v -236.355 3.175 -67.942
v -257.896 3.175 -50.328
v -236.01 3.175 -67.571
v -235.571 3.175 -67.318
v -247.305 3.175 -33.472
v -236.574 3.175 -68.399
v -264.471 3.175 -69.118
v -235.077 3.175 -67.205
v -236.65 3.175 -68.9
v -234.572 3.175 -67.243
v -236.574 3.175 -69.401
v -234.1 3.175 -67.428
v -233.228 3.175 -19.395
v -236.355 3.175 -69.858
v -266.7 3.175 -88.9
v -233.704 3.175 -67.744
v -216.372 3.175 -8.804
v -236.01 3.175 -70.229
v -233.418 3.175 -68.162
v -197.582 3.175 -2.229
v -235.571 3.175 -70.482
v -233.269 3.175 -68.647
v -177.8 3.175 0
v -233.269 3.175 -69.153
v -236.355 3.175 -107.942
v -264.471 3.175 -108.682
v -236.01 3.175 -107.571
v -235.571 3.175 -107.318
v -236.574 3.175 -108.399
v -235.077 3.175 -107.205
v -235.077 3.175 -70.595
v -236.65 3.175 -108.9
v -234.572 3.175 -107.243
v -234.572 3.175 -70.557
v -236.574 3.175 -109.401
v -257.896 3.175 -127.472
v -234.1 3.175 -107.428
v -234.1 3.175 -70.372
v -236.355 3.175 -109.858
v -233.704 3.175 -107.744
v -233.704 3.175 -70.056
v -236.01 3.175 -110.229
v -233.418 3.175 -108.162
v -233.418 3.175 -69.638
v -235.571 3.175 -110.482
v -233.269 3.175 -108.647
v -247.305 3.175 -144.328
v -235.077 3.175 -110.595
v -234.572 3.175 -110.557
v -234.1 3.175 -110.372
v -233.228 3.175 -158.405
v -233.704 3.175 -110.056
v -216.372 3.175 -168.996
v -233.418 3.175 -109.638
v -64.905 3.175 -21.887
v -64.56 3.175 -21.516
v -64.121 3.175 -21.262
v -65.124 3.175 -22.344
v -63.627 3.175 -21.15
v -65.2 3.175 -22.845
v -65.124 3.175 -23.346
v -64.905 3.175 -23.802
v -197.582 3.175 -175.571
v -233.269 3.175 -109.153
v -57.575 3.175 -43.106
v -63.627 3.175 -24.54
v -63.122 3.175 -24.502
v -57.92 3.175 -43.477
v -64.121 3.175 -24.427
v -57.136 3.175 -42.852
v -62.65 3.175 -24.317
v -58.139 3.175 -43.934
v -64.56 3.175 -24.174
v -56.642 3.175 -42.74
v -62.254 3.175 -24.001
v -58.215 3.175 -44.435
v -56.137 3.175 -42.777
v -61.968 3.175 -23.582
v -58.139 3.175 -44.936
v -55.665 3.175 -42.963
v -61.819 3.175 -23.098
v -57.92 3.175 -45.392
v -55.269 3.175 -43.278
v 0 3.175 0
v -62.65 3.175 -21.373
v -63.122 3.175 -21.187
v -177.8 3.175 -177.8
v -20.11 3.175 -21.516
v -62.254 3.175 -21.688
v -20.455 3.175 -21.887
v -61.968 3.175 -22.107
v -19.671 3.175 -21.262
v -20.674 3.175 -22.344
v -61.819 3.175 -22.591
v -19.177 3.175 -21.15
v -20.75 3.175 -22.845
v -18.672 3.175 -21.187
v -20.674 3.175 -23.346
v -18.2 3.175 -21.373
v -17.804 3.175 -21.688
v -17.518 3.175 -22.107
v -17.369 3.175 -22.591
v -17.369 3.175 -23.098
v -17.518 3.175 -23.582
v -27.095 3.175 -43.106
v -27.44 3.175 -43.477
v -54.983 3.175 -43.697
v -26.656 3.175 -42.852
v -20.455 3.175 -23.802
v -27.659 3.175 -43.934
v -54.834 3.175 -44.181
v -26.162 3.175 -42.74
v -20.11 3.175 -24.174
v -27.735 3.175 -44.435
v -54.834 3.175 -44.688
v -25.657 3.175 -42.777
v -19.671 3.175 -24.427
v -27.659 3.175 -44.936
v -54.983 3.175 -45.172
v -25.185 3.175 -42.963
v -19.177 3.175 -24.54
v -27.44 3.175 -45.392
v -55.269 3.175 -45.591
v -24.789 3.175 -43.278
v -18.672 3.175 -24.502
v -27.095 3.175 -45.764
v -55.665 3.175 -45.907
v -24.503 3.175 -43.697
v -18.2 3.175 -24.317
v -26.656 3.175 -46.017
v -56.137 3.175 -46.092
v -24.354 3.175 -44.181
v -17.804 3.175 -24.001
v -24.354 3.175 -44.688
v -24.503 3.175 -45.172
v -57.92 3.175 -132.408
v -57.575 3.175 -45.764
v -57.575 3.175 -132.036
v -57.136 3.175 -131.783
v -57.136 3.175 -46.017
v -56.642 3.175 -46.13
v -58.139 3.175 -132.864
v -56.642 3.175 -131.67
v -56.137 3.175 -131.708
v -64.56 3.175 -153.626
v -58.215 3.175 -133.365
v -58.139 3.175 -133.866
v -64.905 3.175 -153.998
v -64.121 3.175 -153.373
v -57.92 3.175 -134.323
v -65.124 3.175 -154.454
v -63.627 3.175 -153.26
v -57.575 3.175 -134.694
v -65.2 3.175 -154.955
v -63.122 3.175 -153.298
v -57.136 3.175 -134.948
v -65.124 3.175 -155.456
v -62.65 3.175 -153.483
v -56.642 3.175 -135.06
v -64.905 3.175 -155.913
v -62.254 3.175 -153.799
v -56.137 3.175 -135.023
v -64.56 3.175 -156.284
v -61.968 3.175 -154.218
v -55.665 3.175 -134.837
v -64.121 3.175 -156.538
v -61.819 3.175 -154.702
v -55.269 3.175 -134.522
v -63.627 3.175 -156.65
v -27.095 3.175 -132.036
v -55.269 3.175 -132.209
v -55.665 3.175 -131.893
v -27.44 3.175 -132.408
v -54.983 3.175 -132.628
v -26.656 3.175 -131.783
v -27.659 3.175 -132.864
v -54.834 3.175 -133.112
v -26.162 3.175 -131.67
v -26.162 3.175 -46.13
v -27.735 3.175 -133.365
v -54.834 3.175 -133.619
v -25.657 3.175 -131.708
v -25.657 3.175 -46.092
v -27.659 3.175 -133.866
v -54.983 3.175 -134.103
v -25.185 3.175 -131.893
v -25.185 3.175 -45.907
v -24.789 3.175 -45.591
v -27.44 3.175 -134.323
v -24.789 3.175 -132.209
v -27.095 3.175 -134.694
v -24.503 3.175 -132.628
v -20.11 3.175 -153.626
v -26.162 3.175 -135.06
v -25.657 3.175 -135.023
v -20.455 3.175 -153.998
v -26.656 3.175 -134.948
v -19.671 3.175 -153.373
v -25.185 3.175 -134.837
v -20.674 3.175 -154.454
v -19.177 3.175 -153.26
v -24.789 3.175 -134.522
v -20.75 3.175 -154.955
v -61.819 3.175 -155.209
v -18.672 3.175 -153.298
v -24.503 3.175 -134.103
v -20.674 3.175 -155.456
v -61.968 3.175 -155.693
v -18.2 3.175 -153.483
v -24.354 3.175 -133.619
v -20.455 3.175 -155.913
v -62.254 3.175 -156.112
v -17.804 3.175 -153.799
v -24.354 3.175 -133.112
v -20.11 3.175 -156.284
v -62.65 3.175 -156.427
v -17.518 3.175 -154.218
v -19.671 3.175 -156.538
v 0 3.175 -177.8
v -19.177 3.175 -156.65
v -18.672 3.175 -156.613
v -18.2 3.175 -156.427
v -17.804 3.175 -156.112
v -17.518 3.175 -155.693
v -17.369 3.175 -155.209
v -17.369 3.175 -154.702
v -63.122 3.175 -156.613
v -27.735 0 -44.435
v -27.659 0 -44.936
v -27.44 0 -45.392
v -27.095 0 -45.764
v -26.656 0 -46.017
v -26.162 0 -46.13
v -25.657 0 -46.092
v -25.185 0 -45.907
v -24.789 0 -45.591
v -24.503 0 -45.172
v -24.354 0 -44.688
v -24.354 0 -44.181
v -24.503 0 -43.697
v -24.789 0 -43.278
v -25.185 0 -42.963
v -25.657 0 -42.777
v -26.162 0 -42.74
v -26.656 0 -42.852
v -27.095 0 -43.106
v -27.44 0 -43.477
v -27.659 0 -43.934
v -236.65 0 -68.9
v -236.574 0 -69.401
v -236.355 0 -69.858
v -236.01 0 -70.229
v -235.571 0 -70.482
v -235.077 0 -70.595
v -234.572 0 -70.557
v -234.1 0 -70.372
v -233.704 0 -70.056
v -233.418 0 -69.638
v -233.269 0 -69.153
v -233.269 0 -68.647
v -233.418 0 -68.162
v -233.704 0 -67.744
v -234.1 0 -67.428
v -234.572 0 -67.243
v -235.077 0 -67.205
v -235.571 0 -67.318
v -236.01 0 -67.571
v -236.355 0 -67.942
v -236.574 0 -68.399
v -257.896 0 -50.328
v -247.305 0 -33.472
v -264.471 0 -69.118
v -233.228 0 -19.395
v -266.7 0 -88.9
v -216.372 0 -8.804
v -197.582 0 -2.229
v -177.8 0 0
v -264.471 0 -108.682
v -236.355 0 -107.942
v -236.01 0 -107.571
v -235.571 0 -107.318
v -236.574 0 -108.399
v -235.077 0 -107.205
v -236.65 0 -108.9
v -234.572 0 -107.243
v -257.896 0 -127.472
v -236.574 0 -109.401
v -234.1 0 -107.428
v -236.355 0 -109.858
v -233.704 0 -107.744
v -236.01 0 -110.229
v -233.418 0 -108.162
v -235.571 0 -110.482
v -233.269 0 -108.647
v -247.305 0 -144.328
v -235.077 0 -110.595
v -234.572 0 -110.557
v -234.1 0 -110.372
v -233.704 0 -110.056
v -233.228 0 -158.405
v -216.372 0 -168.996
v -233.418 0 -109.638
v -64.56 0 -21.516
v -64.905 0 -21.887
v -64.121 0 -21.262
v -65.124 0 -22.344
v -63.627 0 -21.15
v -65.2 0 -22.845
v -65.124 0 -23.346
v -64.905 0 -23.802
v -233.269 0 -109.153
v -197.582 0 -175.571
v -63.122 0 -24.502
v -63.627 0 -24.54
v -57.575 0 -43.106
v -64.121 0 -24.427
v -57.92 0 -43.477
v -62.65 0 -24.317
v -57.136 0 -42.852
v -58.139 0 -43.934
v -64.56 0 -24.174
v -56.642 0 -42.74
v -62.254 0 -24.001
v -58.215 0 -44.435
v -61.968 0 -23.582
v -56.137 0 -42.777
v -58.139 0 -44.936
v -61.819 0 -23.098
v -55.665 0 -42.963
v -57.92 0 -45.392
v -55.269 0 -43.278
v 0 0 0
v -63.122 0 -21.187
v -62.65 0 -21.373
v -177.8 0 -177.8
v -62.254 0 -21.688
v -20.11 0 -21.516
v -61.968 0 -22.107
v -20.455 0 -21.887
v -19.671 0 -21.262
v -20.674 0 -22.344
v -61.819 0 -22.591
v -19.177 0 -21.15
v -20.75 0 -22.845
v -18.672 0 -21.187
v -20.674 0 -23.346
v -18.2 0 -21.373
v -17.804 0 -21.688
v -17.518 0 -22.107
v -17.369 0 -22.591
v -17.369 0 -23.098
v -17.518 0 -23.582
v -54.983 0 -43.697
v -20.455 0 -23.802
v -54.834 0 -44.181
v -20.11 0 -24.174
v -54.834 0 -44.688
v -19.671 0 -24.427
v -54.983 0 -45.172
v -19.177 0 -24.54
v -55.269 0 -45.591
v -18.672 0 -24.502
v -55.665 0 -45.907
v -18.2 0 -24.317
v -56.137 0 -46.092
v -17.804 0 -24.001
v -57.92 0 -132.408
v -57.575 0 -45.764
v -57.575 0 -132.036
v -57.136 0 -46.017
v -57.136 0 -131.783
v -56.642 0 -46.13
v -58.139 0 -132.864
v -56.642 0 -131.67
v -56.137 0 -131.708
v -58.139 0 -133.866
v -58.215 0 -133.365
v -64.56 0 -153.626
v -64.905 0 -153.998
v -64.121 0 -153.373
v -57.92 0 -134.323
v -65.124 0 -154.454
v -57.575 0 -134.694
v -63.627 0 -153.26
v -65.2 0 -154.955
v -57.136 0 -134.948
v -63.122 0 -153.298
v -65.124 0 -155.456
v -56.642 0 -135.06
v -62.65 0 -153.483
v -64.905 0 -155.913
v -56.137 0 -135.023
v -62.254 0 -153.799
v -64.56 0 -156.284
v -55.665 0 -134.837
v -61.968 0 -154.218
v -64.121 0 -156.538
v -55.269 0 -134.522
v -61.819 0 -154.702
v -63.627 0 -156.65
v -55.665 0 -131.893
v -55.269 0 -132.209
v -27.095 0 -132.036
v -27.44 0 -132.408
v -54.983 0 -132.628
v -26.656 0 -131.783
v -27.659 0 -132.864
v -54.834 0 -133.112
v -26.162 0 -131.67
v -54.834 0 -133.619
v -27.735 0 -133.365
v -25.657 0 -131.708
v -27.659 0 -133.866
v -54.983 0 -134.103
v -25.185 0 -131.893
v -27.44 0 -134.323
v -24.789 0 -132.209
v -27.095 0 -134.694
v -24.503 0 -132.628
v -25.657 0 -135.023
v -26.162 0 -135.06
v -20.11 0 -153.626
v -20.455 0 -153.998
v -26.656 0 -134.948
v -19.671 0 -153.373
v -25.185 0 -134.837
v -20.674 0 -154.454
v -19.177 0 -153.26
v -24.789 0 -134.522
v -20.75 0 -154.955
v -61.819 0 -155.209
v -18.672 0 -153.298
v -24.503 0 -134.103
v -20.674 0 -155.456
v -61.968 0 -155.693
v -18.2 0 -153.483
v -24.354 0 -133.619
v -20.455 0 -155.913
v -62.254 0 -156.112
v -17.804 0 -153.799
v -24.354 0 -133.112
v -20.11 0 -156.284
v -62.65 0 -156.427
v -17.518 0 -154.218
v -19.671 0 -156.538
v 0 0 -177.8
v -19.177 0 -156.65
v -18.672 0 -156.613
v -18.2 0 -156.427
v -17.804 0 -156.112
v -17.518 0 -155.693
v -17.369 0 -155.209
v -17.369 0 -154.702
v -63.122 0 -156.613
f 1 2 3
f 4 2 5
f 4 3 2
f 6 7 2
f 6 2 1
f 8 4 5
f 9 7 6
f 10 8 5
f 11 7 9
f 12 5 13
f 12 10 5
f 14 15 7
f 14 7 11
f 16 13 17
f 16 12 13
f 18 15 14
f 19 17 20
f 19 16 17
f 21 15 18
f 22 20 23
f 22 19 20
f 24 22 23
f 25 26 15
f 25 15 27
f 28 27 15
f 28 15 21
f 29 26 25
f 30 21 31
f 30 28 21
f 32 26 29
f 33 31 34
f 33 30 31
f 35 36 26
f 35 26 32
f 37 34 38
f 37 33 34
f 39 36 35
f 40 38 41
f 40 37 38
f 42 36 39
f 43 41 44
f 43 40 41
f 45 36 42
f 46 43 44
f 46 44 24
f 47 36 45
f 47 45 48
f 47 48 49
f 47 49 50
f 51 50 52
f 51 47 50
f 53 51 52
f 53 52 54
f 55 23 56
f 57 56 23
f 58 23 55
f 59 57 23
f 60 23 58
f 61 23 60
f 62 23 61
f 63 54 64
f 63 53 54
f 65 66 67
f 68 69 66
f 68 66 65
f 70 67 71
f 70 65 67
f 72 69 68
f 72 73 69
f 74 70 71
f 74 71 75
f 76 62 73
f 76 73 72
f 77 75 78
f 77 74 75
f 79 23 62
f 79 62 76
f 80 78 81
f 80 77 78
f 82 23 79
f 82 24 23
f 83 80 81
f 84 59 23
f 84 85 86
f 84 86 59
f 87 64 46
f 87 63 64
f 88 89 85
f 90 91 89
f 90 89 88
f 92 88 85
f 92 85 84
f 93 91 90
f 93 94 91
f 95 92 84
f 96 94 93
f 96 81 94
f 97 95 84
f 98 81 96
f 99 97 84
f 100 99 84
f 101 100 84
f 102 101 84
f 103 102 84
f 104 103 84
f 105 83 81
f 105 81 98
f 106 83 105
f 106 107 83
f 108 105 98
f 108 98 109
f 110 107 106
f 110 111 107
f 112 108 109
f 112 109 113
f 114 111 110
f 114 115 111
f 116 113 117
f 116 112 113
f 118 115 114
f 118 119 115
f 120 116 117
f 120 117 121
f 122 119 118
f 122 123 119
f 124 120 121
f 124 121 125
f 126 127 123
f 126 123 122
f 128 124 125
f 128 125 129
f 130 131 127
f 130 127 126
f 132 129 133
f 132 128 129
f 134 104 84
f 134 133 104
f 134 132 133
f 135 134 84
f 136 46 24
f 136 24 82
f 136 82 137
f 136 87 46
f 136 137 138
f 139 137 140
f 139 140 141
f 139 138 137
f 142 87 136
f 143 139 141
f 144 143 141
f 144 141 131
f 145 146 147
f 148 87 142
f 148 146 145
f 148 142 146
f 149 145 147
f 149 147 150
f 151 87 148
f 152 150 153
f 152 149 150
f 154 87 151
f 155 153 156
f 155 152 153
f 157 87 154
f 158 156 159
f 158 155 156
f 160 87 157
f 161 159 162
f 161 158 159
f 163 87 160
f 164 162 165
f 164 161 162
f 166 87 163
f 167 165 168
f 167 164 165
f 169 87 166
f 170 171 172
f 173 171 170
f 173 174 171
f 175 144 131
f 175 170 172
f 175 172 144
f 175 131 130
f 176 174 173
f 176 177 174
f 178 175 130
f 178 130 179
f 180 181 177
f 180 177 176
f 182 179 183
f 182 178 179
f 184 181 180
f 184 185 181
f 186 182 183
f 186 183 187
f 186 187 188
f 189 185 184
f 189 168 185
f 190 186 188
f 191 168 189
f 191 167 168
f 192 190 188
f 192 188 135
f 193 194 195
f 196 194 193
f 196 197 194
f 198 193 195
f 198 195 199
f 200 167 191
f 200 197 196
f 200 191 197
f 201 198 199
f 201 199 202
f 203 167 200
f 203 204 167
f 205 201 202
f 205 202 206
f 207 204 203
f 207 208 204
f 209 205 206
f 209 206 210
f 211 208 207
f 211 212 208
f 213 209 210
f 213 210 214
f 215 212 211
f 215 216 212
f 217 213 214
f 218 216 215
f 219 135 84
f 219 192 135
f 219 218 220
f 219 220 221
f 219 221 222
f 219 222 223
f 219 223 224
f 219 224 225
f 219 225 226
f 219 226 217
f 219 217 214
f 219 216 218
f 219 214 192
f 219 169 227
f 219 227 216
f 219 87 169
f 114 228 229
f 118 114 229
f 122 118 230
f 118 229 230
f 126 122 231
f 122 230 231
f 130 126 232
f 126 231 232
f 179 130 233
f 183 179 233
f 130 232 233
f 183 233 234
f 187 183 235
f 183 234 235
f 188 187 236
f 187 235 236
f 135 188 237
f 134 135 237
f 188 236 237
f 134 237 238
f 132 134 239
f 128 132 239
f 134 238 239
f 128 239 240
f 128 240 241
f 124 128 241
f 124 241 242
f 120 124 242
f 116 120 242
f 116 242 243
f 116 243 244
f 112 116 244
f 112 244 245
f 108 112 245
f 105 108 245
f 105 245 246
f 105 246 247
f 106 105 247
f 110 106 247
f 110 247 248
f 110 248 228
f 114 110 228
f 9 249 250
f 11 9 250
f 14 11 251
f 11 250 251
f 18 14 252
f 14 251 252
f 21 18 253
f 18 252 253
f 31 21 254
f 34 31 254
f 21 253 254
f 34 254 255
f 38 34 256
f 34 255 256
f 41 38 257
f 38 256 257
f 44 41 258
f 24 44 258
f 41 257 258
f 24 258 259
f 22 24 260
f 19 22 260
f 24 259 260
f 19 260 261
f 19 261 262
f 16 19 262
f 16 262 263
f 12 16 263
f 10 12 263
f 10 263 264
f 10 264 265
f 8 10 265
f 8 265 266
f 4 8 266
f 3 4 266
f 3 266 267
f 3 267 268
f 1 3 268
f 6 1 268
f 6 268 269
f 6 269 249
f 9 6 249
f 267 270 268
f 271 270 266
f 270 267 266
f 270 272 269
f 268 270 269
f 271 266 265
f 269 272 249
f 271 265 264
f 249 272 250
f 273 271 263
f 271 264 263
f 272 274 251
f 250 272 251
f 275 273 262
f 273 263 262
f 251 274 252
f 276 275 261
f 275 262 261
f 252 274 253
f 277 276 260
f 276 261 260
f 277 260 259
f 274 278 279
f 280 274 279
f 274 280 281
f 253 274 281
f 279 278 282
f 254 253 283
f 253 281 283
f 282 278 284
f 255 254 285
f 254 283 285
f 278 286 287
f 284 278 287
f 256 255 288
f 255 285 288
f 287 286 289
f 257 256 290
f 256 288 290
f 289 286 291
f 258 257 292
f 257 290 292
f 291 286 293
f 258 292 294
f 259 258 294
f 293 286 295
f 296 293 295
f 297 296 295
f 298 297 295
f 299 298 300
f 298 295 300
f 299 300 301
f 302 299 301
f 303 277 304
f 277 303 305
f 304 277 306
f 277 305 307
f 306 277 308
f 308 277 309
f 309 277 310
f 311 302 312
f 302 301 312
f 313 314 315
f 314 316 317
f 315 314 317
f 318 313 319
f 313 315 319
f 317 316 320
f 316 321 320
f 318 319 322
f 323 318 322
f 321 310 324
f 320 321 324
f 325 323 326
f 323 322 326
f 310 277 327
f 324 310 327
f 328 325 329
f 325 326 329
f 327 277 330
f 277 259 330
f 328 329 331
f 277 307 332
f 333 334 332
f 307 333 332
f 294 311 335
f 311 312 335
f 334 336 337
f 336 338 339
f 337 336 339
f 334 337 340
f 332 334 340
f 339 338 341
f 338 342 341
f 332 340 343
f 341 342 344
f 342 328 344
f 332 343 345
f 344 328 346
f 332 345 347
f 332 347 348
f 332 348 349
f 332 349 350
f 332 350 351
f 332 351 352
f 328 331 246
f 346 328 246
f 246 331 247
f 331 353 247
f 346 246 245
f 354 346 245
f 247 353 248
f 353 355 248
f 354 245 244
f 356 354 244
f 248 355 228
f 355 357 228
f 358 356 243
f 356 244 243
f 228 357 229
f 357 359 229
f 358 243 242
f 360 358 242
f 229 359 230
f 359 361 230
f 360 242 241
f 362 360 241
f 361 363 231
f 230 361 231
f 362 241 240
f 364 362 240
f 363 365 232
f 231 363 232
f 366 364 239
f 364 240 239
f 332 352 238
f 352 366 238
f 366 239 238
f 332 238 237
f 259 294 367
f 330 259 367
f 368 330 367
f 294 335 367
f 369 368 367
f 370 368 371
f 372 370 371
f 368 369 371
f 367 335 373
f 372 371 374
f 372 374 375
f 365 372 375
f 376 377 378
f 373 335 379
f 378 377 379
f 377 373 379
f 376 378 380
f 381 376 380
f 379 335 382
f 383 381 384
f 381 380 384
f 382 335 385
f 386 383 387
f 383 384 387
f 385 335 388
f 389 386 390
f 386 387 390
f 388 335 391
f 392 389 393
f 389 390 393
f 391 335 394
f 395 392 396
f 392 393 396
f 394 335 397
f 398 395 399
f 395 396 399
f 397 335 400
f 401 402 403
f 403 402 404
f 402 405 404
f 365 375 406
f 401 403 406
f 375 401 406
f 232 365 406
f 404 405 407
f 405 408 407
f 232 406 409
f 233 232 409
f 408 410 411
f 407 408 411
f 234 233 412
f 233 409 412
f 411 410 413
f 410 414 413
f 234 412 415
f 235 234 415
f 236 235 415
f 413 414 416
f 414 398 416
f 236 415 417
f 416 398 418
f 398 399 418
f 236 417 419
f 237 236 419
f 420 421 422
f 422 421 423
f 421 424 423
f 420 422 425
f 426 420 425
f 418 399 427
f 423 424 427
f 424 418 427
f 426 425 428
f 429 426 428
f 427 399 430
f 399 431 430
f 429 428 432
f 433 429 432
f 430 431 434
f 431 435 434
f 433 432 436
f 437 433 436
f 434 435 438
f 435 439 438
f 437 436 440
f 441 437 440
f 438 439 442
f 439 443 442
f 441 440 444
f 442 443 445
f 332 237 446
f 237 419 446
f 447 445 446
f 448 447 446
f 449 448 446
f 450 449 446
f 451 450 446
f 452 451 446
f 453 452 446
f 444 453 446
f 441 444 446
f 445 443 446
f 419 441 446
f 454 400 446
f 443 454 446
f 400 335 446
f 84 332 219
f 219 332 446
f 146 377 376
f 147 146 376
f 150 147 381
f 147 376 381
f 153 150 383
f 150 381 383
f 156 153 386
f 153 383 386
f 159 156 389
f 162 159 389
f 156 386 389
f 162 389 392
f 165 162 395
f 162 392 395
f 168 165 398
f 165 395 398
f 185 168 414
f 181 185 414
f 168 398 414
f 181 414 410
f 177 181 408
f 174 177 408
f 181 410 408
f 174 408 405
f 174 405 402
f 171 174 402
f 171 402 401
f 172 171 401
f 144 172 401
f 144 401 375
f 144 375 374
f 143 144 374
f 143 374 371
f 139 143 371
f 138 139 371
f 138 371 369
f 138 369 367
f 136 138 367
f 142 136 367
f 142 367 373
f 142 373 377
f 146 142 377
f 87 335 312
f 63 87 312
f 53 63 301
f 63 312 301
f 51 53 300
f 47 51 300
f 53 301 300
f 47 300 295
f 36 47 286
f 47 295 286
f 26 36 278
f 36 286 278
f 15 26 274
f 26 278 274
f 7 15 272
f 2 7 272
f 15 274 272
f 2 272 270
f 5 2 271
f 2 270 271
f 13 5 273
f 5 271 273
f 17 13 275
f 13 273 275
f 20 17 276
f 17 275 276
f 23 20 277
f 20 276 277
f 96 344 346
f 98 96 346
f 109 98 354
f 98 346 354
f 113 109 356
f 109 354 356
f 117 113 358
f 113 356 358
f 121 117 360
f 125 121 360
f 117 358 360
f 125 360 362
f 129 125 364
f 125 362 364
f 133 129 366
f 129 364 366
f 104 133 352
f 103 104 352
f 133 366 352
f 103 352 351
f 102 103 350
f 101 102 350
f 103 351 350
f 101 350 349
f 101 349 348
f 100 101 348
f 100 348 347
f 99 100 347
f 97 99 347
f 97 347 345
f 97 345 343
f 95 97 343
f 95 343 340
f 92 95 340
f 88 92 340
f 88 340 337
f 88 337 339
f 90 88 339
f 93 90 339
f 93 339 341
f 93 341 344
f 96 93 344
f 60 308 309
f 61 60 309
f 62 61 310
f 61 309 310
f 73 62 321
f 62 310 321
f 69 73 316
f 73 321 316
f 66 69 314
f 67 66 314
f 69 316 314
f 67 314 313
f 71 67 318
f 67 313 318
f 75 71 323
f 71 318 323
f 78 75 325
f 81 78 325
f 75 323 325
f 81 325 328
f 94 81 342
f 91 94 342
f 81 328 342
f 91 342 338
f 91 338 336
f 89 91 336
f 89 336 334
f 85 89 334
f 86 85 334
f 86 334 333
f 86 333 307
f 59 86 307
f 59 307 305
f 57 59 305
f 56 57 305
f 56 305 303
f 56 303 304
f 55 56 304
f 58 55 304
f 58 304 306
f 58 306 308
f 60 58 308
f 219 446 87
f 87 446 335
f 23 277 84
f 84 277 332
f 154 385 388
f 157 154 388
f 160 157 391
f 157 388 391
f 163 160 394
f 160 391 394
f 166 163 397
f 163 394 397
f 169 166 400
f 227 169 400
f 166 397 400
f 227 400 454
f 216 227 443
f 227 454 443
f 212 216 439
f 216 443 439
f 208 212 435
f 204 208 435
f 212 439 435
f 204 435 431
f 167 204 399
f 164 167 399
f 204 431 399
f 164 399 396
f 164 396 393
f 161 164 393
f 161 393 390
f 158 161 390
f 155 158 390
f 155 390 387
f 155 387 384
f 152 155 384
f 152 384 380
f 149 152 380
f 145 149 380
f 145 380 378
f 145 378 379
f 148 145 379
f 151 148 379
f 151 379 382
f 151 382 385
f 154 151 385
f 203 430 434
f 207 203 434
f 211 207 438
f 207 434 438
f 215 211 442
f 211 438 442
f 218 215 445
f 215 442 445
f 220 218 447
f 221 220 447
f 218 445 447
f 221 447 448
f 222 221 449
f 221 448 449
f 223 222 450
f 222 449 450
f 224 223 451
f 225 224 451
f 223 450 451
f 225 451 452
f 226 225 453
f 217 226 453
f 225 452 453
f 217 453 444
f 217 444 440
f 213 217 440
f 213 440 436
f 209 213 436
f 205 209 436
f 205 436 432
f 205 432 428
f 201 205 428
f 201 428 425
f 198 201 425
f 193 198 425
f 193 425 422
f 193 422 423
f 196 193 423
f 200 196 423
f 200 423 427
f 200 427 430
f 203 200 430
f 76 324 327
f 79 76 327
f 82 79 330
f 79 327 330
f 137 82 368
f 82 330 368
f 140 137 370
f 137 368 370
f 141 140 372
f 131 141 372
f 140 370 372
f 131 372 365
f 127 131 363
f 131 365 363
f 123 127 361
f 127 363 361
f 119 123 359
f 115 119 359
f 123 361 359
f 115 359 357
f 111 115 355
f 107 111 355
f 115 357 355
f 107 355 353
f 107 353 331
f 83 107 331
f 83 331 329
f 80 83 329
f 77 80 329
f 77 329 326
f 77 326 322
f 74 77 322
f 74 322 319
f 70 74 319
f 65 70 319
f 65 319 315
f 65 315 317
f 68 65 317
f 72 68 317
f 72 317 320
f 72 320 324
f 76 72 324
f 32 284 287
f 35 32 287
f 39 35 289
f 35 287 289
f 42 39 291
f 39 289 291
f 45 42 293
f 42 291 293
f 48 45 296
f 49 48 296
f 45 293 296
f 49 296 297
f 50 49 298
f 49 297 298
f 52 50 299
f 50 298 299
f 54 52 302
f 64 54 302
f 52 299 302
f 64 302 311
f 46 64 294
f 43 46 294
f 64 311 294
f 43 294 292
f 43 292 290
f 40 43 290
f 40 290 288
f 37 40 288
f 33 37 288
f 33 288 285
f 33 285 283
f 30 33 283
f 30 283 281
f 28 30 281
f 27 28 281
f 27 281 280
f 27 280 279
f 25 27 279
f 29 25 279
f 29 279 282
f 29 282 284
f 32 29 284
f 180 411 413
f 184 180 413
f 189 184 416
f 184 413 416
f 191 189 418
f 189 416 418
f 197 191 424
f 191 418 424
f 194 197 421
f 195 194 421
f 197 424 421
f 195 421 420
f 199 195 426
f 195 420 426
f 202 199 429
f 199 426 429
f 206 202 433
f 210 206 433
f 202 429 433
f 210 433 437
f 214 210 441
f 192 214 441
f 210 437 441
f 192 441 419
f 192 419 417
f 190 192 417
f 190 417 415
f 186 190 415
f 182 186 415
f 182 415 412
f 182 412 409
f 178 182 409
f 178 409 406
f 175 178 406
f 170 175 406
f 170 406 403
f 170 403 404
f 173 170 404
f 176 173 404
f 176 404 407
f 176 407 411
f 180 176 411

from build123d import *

# Parameters (mm, degrees)
BOSS_EXTRUDE1_DEPTH  = 3.175
M3_CLEARANCE_HOLE1_D = 3.4


with BuildPart() as part:
    # Sketch2 → Boss-Extrude1 (new body)
    with BuildSketch(Plane(origin=(0, 0, 0), x_dir=(1, 0, 0), z_dir=(0, 1, 0))):
        with BuildLine():
            Line((0, 0), (0, 177.8))
            Line((0, 177.8), (-177.8, 177.8))
            ThreePointArc((-177.8, 177.8), (-266.7, 88.9), (-177.8, 0))
            Line((-177.8, 0), (0, 0))
        make_face()
    extrude(amount=BOSS_EXTRUDE1_DEPTH)

    # M3 Clearance Hole1 (through all)
    with Locations(Plane(origin=(0, 3.175, 0), x_dir=(1, 0, 0), z_dir=(0, 1, 0))):
        with Locations((-63.5, 154.95524), (-19.05, 154.95524), (-56.515, 133.36524), (-26.035, 133.36524), (-56.515, 44.43476), (-26.035, 44.43476), (-63.5, 22.84476), (-19.05, 22.84476), (-234.95, 108.9), (-234.95, 68.9)):
            Hole(M3_CLEARANCE_HOLE1_D / 2)


solid = part.part
